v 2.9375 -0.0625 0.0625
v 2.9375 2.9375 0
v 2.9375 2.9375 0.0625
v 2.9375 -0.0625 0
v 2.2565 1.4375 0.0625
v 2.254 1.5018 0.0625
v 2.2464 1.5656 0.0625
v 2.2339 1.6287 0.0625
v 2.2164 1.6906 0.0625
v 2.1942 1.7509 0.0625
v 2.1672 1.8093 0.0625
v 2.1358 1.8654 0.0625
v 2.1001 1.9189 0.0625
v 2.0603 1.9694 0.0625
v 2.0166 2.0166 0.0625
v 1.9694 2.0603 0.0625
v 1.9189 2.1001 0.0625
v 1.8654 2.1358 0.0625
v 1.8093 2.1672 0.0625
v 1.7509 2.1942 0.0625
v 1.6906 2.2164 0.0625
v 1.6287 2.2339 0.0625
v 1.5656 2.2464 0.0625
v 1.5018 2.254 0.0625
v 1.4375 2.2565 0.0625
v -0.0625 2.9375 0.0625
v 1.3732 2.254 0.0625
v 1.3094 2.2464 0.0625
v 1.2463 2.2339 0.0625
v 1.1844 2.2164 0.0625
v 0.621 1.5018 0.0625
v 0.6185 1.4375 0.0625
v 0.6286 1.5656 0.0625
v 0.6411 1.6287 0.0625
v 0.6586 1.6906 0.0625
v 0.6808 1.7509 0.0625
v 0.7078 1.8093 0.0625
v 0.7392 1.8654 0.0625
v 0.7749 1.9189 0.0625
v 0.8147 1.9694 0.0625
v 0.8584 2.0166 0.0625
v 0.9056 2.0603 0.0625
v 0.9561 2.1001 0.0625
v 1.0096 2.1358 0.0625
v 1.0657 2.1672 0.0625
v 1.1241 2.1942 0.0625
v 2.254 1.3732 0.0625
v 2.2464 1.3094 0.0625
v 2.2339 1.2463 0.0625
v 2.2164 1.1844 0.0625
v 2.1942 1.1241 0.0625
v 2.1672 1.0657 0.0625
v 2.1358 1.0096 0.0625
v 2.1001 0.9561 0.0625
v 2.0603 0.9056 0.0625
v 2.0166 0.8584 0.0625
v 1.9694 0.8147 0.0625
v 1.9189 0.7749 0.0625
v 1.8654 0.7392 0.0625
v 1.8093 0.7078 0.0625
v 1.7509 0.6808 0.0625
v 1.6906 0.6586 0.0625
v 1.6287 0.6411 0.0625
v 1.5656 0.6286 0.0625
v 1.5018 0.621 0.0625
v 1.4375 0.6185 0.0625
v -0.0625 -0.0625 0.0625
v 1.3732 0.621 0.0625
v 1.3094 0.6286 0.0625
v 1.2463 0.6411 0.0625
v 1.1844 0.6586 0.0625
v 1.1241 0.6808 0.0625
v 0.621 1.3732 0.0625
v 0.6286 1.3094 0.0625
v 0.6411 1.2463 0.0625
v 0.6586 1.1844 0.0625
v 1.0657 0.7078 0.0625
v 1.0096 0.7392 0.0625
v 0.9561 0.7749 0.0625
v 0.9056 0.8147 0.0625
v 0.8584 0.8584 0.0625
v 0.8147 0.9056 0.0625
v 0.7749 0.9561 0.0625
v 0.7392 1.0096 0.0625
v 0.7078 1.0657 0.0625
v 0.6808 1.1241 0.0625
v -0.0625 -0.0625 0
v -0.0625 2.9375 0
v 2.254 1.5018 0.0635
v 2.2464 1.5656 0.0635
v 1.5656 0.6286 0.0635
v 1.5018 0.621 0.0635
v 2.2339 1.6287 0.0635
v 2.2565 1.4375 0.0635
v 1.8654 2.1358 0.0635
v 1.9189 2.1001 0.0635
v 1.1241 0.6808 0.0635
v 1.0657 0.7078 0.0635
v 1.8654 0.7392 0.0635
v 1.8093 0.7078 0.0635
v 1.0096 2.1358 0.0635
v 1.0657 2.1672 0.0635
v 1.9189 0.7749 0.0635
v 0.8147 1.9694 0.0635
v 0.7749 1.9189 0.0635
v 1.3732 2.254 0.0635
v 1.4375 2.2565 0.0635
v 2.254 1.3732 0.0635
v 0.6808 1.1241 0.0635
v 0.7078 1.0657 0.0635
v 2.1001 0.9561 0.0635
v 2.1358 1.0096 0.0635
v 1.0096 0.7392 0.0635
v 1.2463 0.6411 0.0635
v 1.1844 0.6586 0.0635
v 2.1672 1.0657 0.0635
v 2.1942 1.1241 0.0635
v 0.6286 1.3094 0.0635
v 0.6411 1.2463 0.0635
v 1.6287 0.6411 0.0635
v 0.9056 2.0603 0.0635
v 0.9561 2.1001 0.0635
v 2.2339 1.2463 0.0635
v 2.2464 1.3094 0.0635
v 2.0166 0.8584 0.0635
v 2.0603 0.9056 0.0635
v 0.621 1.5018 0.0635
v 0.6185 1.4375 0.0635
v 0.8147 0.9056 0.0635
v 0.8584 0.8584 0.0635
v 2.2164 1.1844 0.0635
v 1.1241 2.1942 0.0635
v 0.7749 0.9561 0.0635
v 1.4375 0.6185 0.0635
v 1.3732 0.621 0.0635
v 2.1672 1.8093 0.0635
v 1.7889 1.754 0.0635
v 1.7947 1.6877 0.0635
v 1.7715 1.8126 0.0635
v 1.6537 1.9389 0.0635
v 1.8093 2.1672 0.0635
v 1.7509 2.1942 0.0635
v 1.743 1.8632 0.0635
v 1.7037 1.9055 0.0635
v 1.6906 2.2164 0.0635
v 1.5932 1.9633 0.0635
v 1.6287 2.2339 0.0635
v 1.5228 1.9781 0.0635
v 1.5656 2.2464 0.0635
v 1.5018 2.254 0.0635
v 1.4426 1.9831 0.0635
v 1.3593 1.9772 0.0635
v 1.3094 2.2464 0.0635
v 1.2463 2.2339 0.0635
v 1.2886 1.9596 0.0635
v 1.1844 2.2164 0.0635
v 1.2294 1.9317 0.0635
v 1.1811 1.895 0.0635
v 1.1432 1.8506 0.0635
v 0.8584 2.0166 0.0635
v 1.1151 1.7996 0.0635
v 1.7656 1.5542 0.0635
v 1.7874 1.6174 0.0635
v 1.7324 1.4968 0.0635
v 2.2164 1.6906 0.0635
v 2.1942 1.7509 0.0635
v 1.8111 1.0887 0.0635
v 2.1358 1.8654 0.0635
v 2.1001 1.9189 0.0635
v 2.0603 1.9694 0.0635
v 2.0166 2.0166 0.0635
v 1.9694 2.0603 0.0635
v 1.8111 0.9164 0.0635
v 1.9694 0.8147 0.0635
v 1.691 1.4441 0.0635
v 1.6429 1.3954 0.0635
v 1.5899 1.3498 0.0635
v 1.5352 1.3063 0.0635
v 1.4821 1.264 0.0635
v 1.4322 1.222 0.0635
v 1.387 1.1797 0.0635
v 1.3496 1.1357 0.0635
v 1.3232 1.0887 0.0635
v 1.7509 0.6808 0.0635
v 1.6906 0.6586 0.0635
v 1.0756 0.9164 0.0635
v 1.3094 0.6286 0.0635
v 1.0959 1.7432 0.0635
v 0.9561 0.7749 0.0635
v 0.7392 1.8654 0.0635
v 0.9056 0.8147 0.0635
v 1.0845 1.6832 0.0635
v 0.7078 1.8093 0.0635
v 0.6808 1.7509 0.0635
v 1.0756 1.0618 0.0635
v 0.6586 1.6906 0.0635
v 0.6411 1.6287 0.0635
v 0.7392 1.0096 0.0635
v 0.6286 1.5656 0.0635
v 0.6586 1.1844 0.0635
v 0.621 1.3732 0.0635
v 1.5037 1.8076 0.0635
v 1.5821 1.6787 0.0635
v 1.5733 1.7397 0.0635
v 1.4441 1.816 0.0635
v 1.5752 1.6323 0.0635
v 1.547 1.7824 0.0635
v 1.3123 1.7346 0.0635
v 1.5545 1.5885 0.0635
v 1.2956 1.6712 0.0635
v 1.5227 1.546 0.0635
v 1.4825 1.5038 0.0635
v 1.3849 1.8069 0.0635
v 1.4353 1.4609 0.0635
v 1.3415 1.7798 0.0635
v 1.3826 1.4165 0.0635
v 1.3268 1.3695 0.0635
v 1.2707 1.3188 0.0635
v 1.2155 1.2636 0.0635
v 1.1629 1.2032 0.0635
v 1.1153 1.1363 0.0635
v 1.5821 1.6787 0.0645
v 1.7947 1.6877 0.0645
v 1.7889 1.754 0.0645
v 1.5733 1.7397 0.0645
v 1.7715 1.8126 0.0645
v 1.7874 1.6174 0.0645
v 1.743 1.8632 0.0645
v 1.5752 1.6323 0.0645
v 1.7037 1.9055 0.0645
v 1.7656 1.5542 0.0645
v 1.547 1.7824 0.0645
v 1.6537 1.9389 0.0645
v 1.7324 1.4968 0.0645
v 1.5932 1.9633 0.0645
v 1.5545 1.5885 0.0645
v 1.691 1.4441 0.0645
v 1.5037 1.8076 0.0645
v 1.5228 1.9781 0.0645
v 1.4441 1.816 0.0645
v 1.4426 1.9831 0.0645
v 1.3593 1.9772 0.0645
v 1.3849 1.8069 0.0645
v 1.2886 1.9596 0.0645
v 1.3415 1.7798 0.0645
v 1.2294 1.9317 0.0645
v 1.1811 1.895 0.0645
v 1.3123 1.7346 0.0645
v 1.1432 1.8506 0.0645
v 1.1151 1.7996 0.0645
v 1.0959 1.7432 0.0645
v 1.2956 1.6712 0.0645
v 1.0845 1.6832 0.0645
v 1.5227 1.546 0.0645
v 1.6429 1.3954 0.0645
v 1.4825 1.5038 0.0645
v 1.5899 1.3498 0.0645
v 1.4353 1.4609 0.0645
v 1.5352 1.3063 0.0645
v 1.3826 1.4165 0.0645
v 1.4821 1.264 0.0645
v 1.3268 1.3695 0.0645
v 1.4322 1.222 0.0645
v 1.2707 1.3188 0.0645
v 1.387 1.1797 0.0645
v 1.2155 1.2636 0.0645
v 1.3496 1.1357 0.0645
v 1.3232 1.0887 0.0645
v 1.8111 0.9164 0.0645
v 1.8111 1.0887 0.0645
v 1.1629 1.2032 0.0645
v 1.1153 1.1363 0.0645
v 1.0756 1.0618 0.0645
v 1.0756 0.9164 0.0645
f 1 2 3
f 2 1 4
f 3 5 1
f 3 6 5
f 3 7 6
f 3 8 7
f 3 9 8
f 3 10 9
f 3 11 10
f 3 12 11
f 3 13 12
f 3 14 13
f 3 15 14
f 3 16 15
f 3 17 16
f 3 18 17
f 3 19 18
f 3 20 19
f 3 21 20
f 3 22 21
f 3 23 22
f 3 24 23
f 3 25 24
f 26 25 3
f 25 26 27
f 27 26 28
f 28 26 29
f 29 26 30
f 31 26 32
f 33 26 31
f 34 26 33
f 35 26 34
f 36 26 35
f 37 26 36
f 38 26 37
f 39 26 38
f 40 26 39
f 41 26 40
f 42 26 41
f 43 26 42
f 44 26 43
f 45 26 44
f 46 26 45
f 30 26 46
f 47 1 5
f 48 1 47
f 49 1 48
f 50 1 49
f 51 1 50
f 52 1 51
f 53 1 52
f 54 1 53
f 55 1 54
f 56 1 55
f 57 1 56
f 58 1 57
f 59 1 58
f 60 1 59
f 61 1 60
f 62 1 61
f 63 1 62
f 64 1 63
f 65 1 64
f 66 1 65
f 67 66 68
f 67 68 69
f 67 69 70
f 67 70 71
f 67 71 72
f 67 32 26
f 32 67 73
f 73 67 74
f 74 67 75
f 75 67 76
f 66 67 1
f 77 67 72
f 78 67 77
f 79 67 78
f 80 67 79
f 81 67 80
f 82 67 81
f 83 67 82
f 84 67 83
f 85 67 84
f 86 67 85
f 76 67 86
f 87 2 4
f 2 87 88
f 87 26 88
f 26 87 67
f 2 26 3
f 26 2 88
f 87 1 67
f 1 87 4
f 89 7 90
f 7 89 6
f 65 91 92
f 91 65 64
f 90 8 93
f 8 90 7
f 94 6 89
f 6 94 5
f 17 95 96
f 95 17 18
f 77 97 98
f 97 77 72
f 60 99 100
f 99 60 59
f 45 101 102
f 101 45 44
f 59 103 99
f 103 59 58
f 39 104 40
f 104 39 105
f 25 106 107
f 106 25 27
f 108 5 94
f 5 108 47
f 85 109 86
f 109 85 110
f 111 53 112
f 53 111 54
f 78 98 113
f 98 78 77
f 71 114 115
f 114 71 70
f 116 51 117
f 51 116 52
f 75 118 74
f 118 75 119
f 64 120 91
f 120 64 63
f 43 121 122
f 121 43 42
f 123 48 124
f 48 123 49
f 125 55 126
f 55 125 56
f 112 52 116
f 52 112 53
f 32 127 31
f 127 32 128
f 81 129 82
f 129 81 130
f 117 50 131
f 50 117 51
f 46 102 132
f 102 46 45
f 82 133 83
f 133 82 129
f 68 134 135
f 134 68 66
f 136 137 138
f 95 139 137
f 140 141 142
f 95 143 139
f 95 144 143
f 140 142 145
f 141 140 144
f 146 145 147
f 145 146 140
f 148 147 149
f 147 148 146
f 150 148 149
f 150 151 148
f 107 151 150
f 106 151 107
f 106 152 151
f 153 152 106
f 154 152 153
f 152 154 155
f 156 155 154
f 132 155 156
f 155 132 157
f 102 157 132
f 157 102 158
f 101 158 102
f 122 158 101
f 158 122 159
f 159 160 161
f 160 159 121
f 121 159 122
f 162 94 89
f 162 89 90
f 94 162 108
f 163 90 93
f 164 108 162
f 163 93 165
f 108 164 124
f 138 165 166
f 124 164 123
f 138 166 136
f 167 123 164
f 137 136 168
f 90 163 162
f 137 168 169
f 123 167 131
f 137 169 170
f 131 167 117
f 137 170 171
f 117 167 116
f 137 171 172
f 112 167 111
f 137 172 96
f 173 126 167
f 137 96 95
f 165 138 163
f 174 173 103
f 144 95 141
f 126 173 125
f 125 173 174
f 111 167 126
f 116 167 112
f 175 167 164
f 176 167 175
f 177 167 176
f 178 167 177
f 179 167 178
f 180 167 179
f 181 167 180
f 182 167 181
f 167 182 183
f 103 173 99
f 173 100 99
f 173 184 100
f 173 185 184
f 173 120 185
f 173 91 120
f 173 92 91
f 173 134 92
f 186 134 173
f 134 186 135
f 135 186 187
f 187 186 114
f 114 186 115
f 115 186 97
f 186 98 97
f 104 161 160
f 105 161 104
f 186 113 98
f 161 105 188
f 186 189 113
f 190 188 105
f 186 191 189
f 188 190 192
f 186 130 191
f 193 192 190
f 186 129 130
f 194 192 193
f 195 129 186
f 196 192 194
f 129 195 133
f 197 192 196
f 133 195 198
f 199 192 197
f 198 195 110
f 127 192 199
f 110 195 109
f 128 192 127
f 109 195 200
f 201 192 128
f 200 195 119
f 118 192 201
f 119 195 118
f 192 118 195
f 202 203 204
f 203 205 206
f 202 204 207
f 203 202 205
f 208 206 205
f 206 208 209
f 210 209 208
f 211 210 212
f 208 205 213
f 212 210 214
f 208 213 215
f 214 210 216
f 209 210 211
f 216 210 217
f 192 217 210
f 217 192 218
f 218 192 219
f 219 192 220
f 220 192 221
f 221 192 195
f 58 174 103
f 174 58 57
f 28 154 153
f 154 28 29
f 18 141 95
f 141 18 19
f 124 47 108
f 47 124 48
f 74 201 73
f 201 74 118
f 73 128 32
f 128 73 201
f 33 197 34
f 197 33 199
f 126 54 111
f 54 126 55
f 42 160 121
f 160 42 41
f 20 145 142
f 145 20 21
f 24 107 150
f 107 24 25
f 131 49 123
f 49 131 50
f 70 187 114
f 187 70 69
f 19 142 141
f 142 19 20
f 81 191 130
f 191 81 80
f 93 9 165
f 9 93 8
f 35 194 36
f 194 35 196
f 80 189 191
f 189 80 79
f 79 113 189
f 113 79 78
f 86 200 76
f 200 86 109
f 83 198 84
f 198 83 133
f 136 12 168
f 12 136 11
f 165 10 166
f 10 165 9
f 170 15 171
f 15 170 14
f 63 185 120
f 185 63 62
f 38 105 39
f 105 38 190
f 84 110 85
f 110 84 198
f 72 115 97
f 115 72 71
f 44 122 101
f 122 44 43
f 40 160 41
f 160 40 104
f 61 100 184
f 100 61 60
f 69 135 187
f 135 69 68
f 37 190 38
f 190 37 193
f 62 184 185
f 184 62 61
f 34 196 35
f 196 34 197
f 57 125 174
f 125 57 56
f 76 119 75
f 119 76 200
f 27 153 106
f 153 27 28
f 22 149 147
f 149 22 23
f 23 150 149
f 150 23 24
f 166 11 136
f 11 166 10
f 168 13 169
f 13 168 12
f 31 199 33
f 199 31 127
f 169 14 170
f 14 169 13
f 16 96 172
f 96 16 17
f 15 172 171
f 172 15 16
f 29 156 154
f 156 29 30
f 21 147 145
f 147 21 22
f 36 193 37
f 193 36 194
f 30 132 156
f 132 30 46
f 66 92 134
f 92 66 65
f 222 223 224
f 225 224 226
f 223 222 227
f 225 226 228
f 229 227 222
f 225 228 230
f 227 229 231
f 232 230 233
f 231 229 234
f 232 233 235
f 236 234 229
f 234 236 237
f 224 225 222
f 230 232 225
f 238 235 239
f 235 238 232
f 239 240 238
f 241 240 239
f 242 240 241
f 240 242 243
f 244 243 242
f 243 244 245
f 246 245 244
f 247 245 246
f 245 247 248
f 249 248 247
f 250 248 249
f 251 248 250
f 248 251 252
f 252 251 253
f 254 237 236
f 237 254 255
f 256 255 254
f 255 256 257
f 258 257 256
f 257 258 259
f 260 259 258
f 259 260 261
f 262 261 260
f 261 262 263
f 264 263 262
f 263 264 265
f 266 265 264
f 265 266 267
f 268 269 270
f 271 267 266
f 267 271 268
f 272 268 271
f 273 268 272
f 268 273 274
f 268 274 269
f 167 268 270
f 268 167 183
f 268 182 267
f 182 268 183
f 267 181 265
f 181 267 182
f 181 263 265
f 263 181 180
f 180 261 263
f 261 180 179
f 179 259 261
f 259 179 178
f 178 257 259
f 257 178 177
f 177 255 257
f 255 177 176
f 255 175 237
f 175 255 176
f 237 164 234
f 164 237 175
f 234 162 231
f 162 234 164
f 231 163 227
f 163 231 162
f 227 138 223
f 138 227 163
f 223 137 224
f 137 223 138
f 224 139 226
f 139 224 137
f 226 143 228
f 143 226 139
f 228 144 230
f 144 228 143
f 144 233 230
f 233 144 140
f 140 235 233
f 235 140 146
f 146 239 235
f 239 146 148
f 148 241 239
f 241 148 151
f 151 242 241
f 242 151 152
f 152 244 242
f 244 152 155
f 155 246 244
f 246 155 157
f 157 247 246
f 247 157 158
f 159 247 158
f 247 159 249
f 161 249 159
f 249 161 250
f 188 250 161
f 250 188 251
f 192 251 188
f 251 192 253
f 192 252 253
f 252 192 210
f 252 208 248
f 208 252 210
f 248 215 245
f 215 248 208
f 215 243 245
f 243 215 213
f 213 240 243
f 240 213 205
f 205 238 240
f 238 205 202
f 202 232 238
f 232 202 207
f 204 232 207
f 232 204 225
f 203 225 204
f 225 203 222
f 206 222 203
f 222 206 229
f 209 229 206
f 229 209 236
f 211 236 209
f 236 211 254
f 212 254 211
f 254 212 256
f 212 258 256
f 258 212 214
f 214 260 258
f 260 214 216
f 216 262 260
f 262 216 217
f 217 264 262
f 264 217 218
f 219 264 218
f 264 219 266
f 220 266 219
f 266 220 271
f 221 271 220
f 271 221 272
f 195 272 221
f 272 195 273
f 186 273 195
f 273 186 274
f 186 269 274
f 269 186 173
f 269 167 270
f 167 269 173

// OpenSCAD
// element110.scad
// Spur gear tile — centered black gear ring with trapezoidal teeth.
// The open bore reveals a lighter interior (gear_bore module).
// Units: inches

plate_w = 2 + 7/8;
plate_d = 2 + 7/8;
plate_h = 1/16;
frame_w = 1/16;

hole_d = 3/32;
hole_r = hole_d / 2;

// Gear geometry — centered on tile
gear_n      = 20;    // number of teeth
gear_r_tip  = 1.18;  // outer radius at tooth tips
gear_r_root = 1.00;  // root radius at base of teeth
gear_r_bore = 0.82;  // bore (inner hole) radius
tooth_hw    = 4.5;   // half-angle of each tooth in degrees (total = 9°, gap = 9°)
tooth_tip_f = 0.80;  // tooth tip is narrower than base by this factor

// ── Standard modules ─────────────────────────────────────────────────────────

module rivet_holes() {
    spacing_x = plate_w / 10;
    spacing_y = plate_d / 10;
    inset_x   = spacing_x / 2;
    inset_y   = spacing_y / 2;
    // Front edge
    for (i = [0:9])
        translate([inset_x + i * spacing_x, inset_y,         -1])
            cylinder(h = plate_h + 2, r = hole_r, $fn = 20);
    // Back edge
    for (i = [0:9])
        translate([inset_x + i * spacing_x, plate_d - inset_y, -1])
            cylinder(h = plate_h + 2, r = hole_r, $fn = 20);
    // Left edge
    for (i = [0:9])
        translate([inset_x,           inset_y + i * spacing_y, -1])
            cylinder(h = plate_h + 2, r = hole_r, $fn = 20);
    // Right edge
    for (i = [0:9])
        translate([plate_w - inset_x, inset_y + i * spacing_y, -1])
            cylinder(h = plate_h + 2, r = hole_r, $fn = 20);
}

module frame() {
    color("black")
    difference() {
        translate([-frame_w, -frame_w, 0])
            cube([plate_w + 2 * frame_w, plate_d + 2 * frame_w, plate_h]);
        translate([0, 0, -0.001])
            cube([plate_w, plate_d, plate_h + 0.002]);
    }
}

module plate() {
    difference() {
        color("darkgray")
            cube([plate_w, plate_d, plate_h]);
        rivet_holes();
    }
}

rivet_h = plate_h;
module rivets() {
    spacing_x = plate_w / 10;
    spacing_y = plate_d / 10;
    inset_x   = spacing_x / 2;
    inset_y   = spacing_y / 2;
    color("lightgray") {
        for (i = [0:9])
            translate([inset_x + i * spacing_x, inset_y,         0])
                cylinder(h = rivet_h, r = hole_r, $fn = 20);
        for (i = [0:9])
            translate([inset_x + i * spacing_x, plate_d - inset_y, 0])
                cylinder(h = rivet_h, r = hole_r, $fn = 20);
        for (i = [0:9])
            translate([inset_x,           inset_y + i * spacing_y, 0])
                cylinder(h = rivet_h, r = hole_r, $fn = 20);
        for (i = [0:9])
            translate([plate_w - inset_x, inset_y + i * spacing_y, 0])
                cylinder(h = rivet_h, r = hole_r, $fn = 20);
    }
}

// ── Gear modules ─────────────────────────────────────────────────────────────

// Single trapezoidal tooth pointing in +x direction (before rotation)
module gear_tooth_2d() {
    polygon([
        [gear_r_root * cos(-tooth_hw),             gear_r_root * sin(-tooth_hw)],
        [gear_r_tip  * cos(-tooth_hw * tooth_tip_f), gear_r_tip  * sin(-tooth_hw * tooth_tip_f)],
        [gear_r_tip  * cos( tooth_hw * tooth_tip_f), gear_r_tip  * sin( tooth_hw * tooth_tip_f)],
        [gear_r_root * cos( tooth_hw),             gear_r_root * sin( tooth_hw)],
    ]);
}

// Full 2D gear profile (ring + teeth, without bore subtracted)
module gear_2d() {
    pitch = 360 / gear_n;
    union() {
        circle(r = gear_r_root, $fn = gear_n * 8);
        for (i = [0:gear_n - 1])
            rotate([0, 0, i * pitch])
                gear_tooth_2d();
    }
}

// Black gear ring + teeth with open bore
module gear() {
    color("black")
    translate([plate_w / 2, plate_d / 2, 0])
    linear_extrude(plate_h)
    difference() {
        gear_2d();
        circle(r = gear_r_bore, $fn = 80);
    }
}

// Lighter fill inside the bore (silver interior visible through center)
module gear_bore() {
    color([0.80, 0.80, 0.80])
    translate([plate_w / 2, plate_d / 2, 0])
    linear_extrude(plate_h + 0.001)
    circle(r = gear_r_bore - 0.001, $fn = 80);
}

// Green "1" centered inside the bore
module gear_label() {
    color("green")
    translate([plate_w / 2, plate_d / 2, 0])
    linear_extrude(plate_h + 0.002)
    text("2", size = 1.1, halign = "center", valign = "center",
         font = "Liberation Sans:style=Bold");
}

// ── Assembly ─────────────────────────────────────────────────────────────────

frame();
plate();
rivets();
gear_bore();
gear();
gear_label();
